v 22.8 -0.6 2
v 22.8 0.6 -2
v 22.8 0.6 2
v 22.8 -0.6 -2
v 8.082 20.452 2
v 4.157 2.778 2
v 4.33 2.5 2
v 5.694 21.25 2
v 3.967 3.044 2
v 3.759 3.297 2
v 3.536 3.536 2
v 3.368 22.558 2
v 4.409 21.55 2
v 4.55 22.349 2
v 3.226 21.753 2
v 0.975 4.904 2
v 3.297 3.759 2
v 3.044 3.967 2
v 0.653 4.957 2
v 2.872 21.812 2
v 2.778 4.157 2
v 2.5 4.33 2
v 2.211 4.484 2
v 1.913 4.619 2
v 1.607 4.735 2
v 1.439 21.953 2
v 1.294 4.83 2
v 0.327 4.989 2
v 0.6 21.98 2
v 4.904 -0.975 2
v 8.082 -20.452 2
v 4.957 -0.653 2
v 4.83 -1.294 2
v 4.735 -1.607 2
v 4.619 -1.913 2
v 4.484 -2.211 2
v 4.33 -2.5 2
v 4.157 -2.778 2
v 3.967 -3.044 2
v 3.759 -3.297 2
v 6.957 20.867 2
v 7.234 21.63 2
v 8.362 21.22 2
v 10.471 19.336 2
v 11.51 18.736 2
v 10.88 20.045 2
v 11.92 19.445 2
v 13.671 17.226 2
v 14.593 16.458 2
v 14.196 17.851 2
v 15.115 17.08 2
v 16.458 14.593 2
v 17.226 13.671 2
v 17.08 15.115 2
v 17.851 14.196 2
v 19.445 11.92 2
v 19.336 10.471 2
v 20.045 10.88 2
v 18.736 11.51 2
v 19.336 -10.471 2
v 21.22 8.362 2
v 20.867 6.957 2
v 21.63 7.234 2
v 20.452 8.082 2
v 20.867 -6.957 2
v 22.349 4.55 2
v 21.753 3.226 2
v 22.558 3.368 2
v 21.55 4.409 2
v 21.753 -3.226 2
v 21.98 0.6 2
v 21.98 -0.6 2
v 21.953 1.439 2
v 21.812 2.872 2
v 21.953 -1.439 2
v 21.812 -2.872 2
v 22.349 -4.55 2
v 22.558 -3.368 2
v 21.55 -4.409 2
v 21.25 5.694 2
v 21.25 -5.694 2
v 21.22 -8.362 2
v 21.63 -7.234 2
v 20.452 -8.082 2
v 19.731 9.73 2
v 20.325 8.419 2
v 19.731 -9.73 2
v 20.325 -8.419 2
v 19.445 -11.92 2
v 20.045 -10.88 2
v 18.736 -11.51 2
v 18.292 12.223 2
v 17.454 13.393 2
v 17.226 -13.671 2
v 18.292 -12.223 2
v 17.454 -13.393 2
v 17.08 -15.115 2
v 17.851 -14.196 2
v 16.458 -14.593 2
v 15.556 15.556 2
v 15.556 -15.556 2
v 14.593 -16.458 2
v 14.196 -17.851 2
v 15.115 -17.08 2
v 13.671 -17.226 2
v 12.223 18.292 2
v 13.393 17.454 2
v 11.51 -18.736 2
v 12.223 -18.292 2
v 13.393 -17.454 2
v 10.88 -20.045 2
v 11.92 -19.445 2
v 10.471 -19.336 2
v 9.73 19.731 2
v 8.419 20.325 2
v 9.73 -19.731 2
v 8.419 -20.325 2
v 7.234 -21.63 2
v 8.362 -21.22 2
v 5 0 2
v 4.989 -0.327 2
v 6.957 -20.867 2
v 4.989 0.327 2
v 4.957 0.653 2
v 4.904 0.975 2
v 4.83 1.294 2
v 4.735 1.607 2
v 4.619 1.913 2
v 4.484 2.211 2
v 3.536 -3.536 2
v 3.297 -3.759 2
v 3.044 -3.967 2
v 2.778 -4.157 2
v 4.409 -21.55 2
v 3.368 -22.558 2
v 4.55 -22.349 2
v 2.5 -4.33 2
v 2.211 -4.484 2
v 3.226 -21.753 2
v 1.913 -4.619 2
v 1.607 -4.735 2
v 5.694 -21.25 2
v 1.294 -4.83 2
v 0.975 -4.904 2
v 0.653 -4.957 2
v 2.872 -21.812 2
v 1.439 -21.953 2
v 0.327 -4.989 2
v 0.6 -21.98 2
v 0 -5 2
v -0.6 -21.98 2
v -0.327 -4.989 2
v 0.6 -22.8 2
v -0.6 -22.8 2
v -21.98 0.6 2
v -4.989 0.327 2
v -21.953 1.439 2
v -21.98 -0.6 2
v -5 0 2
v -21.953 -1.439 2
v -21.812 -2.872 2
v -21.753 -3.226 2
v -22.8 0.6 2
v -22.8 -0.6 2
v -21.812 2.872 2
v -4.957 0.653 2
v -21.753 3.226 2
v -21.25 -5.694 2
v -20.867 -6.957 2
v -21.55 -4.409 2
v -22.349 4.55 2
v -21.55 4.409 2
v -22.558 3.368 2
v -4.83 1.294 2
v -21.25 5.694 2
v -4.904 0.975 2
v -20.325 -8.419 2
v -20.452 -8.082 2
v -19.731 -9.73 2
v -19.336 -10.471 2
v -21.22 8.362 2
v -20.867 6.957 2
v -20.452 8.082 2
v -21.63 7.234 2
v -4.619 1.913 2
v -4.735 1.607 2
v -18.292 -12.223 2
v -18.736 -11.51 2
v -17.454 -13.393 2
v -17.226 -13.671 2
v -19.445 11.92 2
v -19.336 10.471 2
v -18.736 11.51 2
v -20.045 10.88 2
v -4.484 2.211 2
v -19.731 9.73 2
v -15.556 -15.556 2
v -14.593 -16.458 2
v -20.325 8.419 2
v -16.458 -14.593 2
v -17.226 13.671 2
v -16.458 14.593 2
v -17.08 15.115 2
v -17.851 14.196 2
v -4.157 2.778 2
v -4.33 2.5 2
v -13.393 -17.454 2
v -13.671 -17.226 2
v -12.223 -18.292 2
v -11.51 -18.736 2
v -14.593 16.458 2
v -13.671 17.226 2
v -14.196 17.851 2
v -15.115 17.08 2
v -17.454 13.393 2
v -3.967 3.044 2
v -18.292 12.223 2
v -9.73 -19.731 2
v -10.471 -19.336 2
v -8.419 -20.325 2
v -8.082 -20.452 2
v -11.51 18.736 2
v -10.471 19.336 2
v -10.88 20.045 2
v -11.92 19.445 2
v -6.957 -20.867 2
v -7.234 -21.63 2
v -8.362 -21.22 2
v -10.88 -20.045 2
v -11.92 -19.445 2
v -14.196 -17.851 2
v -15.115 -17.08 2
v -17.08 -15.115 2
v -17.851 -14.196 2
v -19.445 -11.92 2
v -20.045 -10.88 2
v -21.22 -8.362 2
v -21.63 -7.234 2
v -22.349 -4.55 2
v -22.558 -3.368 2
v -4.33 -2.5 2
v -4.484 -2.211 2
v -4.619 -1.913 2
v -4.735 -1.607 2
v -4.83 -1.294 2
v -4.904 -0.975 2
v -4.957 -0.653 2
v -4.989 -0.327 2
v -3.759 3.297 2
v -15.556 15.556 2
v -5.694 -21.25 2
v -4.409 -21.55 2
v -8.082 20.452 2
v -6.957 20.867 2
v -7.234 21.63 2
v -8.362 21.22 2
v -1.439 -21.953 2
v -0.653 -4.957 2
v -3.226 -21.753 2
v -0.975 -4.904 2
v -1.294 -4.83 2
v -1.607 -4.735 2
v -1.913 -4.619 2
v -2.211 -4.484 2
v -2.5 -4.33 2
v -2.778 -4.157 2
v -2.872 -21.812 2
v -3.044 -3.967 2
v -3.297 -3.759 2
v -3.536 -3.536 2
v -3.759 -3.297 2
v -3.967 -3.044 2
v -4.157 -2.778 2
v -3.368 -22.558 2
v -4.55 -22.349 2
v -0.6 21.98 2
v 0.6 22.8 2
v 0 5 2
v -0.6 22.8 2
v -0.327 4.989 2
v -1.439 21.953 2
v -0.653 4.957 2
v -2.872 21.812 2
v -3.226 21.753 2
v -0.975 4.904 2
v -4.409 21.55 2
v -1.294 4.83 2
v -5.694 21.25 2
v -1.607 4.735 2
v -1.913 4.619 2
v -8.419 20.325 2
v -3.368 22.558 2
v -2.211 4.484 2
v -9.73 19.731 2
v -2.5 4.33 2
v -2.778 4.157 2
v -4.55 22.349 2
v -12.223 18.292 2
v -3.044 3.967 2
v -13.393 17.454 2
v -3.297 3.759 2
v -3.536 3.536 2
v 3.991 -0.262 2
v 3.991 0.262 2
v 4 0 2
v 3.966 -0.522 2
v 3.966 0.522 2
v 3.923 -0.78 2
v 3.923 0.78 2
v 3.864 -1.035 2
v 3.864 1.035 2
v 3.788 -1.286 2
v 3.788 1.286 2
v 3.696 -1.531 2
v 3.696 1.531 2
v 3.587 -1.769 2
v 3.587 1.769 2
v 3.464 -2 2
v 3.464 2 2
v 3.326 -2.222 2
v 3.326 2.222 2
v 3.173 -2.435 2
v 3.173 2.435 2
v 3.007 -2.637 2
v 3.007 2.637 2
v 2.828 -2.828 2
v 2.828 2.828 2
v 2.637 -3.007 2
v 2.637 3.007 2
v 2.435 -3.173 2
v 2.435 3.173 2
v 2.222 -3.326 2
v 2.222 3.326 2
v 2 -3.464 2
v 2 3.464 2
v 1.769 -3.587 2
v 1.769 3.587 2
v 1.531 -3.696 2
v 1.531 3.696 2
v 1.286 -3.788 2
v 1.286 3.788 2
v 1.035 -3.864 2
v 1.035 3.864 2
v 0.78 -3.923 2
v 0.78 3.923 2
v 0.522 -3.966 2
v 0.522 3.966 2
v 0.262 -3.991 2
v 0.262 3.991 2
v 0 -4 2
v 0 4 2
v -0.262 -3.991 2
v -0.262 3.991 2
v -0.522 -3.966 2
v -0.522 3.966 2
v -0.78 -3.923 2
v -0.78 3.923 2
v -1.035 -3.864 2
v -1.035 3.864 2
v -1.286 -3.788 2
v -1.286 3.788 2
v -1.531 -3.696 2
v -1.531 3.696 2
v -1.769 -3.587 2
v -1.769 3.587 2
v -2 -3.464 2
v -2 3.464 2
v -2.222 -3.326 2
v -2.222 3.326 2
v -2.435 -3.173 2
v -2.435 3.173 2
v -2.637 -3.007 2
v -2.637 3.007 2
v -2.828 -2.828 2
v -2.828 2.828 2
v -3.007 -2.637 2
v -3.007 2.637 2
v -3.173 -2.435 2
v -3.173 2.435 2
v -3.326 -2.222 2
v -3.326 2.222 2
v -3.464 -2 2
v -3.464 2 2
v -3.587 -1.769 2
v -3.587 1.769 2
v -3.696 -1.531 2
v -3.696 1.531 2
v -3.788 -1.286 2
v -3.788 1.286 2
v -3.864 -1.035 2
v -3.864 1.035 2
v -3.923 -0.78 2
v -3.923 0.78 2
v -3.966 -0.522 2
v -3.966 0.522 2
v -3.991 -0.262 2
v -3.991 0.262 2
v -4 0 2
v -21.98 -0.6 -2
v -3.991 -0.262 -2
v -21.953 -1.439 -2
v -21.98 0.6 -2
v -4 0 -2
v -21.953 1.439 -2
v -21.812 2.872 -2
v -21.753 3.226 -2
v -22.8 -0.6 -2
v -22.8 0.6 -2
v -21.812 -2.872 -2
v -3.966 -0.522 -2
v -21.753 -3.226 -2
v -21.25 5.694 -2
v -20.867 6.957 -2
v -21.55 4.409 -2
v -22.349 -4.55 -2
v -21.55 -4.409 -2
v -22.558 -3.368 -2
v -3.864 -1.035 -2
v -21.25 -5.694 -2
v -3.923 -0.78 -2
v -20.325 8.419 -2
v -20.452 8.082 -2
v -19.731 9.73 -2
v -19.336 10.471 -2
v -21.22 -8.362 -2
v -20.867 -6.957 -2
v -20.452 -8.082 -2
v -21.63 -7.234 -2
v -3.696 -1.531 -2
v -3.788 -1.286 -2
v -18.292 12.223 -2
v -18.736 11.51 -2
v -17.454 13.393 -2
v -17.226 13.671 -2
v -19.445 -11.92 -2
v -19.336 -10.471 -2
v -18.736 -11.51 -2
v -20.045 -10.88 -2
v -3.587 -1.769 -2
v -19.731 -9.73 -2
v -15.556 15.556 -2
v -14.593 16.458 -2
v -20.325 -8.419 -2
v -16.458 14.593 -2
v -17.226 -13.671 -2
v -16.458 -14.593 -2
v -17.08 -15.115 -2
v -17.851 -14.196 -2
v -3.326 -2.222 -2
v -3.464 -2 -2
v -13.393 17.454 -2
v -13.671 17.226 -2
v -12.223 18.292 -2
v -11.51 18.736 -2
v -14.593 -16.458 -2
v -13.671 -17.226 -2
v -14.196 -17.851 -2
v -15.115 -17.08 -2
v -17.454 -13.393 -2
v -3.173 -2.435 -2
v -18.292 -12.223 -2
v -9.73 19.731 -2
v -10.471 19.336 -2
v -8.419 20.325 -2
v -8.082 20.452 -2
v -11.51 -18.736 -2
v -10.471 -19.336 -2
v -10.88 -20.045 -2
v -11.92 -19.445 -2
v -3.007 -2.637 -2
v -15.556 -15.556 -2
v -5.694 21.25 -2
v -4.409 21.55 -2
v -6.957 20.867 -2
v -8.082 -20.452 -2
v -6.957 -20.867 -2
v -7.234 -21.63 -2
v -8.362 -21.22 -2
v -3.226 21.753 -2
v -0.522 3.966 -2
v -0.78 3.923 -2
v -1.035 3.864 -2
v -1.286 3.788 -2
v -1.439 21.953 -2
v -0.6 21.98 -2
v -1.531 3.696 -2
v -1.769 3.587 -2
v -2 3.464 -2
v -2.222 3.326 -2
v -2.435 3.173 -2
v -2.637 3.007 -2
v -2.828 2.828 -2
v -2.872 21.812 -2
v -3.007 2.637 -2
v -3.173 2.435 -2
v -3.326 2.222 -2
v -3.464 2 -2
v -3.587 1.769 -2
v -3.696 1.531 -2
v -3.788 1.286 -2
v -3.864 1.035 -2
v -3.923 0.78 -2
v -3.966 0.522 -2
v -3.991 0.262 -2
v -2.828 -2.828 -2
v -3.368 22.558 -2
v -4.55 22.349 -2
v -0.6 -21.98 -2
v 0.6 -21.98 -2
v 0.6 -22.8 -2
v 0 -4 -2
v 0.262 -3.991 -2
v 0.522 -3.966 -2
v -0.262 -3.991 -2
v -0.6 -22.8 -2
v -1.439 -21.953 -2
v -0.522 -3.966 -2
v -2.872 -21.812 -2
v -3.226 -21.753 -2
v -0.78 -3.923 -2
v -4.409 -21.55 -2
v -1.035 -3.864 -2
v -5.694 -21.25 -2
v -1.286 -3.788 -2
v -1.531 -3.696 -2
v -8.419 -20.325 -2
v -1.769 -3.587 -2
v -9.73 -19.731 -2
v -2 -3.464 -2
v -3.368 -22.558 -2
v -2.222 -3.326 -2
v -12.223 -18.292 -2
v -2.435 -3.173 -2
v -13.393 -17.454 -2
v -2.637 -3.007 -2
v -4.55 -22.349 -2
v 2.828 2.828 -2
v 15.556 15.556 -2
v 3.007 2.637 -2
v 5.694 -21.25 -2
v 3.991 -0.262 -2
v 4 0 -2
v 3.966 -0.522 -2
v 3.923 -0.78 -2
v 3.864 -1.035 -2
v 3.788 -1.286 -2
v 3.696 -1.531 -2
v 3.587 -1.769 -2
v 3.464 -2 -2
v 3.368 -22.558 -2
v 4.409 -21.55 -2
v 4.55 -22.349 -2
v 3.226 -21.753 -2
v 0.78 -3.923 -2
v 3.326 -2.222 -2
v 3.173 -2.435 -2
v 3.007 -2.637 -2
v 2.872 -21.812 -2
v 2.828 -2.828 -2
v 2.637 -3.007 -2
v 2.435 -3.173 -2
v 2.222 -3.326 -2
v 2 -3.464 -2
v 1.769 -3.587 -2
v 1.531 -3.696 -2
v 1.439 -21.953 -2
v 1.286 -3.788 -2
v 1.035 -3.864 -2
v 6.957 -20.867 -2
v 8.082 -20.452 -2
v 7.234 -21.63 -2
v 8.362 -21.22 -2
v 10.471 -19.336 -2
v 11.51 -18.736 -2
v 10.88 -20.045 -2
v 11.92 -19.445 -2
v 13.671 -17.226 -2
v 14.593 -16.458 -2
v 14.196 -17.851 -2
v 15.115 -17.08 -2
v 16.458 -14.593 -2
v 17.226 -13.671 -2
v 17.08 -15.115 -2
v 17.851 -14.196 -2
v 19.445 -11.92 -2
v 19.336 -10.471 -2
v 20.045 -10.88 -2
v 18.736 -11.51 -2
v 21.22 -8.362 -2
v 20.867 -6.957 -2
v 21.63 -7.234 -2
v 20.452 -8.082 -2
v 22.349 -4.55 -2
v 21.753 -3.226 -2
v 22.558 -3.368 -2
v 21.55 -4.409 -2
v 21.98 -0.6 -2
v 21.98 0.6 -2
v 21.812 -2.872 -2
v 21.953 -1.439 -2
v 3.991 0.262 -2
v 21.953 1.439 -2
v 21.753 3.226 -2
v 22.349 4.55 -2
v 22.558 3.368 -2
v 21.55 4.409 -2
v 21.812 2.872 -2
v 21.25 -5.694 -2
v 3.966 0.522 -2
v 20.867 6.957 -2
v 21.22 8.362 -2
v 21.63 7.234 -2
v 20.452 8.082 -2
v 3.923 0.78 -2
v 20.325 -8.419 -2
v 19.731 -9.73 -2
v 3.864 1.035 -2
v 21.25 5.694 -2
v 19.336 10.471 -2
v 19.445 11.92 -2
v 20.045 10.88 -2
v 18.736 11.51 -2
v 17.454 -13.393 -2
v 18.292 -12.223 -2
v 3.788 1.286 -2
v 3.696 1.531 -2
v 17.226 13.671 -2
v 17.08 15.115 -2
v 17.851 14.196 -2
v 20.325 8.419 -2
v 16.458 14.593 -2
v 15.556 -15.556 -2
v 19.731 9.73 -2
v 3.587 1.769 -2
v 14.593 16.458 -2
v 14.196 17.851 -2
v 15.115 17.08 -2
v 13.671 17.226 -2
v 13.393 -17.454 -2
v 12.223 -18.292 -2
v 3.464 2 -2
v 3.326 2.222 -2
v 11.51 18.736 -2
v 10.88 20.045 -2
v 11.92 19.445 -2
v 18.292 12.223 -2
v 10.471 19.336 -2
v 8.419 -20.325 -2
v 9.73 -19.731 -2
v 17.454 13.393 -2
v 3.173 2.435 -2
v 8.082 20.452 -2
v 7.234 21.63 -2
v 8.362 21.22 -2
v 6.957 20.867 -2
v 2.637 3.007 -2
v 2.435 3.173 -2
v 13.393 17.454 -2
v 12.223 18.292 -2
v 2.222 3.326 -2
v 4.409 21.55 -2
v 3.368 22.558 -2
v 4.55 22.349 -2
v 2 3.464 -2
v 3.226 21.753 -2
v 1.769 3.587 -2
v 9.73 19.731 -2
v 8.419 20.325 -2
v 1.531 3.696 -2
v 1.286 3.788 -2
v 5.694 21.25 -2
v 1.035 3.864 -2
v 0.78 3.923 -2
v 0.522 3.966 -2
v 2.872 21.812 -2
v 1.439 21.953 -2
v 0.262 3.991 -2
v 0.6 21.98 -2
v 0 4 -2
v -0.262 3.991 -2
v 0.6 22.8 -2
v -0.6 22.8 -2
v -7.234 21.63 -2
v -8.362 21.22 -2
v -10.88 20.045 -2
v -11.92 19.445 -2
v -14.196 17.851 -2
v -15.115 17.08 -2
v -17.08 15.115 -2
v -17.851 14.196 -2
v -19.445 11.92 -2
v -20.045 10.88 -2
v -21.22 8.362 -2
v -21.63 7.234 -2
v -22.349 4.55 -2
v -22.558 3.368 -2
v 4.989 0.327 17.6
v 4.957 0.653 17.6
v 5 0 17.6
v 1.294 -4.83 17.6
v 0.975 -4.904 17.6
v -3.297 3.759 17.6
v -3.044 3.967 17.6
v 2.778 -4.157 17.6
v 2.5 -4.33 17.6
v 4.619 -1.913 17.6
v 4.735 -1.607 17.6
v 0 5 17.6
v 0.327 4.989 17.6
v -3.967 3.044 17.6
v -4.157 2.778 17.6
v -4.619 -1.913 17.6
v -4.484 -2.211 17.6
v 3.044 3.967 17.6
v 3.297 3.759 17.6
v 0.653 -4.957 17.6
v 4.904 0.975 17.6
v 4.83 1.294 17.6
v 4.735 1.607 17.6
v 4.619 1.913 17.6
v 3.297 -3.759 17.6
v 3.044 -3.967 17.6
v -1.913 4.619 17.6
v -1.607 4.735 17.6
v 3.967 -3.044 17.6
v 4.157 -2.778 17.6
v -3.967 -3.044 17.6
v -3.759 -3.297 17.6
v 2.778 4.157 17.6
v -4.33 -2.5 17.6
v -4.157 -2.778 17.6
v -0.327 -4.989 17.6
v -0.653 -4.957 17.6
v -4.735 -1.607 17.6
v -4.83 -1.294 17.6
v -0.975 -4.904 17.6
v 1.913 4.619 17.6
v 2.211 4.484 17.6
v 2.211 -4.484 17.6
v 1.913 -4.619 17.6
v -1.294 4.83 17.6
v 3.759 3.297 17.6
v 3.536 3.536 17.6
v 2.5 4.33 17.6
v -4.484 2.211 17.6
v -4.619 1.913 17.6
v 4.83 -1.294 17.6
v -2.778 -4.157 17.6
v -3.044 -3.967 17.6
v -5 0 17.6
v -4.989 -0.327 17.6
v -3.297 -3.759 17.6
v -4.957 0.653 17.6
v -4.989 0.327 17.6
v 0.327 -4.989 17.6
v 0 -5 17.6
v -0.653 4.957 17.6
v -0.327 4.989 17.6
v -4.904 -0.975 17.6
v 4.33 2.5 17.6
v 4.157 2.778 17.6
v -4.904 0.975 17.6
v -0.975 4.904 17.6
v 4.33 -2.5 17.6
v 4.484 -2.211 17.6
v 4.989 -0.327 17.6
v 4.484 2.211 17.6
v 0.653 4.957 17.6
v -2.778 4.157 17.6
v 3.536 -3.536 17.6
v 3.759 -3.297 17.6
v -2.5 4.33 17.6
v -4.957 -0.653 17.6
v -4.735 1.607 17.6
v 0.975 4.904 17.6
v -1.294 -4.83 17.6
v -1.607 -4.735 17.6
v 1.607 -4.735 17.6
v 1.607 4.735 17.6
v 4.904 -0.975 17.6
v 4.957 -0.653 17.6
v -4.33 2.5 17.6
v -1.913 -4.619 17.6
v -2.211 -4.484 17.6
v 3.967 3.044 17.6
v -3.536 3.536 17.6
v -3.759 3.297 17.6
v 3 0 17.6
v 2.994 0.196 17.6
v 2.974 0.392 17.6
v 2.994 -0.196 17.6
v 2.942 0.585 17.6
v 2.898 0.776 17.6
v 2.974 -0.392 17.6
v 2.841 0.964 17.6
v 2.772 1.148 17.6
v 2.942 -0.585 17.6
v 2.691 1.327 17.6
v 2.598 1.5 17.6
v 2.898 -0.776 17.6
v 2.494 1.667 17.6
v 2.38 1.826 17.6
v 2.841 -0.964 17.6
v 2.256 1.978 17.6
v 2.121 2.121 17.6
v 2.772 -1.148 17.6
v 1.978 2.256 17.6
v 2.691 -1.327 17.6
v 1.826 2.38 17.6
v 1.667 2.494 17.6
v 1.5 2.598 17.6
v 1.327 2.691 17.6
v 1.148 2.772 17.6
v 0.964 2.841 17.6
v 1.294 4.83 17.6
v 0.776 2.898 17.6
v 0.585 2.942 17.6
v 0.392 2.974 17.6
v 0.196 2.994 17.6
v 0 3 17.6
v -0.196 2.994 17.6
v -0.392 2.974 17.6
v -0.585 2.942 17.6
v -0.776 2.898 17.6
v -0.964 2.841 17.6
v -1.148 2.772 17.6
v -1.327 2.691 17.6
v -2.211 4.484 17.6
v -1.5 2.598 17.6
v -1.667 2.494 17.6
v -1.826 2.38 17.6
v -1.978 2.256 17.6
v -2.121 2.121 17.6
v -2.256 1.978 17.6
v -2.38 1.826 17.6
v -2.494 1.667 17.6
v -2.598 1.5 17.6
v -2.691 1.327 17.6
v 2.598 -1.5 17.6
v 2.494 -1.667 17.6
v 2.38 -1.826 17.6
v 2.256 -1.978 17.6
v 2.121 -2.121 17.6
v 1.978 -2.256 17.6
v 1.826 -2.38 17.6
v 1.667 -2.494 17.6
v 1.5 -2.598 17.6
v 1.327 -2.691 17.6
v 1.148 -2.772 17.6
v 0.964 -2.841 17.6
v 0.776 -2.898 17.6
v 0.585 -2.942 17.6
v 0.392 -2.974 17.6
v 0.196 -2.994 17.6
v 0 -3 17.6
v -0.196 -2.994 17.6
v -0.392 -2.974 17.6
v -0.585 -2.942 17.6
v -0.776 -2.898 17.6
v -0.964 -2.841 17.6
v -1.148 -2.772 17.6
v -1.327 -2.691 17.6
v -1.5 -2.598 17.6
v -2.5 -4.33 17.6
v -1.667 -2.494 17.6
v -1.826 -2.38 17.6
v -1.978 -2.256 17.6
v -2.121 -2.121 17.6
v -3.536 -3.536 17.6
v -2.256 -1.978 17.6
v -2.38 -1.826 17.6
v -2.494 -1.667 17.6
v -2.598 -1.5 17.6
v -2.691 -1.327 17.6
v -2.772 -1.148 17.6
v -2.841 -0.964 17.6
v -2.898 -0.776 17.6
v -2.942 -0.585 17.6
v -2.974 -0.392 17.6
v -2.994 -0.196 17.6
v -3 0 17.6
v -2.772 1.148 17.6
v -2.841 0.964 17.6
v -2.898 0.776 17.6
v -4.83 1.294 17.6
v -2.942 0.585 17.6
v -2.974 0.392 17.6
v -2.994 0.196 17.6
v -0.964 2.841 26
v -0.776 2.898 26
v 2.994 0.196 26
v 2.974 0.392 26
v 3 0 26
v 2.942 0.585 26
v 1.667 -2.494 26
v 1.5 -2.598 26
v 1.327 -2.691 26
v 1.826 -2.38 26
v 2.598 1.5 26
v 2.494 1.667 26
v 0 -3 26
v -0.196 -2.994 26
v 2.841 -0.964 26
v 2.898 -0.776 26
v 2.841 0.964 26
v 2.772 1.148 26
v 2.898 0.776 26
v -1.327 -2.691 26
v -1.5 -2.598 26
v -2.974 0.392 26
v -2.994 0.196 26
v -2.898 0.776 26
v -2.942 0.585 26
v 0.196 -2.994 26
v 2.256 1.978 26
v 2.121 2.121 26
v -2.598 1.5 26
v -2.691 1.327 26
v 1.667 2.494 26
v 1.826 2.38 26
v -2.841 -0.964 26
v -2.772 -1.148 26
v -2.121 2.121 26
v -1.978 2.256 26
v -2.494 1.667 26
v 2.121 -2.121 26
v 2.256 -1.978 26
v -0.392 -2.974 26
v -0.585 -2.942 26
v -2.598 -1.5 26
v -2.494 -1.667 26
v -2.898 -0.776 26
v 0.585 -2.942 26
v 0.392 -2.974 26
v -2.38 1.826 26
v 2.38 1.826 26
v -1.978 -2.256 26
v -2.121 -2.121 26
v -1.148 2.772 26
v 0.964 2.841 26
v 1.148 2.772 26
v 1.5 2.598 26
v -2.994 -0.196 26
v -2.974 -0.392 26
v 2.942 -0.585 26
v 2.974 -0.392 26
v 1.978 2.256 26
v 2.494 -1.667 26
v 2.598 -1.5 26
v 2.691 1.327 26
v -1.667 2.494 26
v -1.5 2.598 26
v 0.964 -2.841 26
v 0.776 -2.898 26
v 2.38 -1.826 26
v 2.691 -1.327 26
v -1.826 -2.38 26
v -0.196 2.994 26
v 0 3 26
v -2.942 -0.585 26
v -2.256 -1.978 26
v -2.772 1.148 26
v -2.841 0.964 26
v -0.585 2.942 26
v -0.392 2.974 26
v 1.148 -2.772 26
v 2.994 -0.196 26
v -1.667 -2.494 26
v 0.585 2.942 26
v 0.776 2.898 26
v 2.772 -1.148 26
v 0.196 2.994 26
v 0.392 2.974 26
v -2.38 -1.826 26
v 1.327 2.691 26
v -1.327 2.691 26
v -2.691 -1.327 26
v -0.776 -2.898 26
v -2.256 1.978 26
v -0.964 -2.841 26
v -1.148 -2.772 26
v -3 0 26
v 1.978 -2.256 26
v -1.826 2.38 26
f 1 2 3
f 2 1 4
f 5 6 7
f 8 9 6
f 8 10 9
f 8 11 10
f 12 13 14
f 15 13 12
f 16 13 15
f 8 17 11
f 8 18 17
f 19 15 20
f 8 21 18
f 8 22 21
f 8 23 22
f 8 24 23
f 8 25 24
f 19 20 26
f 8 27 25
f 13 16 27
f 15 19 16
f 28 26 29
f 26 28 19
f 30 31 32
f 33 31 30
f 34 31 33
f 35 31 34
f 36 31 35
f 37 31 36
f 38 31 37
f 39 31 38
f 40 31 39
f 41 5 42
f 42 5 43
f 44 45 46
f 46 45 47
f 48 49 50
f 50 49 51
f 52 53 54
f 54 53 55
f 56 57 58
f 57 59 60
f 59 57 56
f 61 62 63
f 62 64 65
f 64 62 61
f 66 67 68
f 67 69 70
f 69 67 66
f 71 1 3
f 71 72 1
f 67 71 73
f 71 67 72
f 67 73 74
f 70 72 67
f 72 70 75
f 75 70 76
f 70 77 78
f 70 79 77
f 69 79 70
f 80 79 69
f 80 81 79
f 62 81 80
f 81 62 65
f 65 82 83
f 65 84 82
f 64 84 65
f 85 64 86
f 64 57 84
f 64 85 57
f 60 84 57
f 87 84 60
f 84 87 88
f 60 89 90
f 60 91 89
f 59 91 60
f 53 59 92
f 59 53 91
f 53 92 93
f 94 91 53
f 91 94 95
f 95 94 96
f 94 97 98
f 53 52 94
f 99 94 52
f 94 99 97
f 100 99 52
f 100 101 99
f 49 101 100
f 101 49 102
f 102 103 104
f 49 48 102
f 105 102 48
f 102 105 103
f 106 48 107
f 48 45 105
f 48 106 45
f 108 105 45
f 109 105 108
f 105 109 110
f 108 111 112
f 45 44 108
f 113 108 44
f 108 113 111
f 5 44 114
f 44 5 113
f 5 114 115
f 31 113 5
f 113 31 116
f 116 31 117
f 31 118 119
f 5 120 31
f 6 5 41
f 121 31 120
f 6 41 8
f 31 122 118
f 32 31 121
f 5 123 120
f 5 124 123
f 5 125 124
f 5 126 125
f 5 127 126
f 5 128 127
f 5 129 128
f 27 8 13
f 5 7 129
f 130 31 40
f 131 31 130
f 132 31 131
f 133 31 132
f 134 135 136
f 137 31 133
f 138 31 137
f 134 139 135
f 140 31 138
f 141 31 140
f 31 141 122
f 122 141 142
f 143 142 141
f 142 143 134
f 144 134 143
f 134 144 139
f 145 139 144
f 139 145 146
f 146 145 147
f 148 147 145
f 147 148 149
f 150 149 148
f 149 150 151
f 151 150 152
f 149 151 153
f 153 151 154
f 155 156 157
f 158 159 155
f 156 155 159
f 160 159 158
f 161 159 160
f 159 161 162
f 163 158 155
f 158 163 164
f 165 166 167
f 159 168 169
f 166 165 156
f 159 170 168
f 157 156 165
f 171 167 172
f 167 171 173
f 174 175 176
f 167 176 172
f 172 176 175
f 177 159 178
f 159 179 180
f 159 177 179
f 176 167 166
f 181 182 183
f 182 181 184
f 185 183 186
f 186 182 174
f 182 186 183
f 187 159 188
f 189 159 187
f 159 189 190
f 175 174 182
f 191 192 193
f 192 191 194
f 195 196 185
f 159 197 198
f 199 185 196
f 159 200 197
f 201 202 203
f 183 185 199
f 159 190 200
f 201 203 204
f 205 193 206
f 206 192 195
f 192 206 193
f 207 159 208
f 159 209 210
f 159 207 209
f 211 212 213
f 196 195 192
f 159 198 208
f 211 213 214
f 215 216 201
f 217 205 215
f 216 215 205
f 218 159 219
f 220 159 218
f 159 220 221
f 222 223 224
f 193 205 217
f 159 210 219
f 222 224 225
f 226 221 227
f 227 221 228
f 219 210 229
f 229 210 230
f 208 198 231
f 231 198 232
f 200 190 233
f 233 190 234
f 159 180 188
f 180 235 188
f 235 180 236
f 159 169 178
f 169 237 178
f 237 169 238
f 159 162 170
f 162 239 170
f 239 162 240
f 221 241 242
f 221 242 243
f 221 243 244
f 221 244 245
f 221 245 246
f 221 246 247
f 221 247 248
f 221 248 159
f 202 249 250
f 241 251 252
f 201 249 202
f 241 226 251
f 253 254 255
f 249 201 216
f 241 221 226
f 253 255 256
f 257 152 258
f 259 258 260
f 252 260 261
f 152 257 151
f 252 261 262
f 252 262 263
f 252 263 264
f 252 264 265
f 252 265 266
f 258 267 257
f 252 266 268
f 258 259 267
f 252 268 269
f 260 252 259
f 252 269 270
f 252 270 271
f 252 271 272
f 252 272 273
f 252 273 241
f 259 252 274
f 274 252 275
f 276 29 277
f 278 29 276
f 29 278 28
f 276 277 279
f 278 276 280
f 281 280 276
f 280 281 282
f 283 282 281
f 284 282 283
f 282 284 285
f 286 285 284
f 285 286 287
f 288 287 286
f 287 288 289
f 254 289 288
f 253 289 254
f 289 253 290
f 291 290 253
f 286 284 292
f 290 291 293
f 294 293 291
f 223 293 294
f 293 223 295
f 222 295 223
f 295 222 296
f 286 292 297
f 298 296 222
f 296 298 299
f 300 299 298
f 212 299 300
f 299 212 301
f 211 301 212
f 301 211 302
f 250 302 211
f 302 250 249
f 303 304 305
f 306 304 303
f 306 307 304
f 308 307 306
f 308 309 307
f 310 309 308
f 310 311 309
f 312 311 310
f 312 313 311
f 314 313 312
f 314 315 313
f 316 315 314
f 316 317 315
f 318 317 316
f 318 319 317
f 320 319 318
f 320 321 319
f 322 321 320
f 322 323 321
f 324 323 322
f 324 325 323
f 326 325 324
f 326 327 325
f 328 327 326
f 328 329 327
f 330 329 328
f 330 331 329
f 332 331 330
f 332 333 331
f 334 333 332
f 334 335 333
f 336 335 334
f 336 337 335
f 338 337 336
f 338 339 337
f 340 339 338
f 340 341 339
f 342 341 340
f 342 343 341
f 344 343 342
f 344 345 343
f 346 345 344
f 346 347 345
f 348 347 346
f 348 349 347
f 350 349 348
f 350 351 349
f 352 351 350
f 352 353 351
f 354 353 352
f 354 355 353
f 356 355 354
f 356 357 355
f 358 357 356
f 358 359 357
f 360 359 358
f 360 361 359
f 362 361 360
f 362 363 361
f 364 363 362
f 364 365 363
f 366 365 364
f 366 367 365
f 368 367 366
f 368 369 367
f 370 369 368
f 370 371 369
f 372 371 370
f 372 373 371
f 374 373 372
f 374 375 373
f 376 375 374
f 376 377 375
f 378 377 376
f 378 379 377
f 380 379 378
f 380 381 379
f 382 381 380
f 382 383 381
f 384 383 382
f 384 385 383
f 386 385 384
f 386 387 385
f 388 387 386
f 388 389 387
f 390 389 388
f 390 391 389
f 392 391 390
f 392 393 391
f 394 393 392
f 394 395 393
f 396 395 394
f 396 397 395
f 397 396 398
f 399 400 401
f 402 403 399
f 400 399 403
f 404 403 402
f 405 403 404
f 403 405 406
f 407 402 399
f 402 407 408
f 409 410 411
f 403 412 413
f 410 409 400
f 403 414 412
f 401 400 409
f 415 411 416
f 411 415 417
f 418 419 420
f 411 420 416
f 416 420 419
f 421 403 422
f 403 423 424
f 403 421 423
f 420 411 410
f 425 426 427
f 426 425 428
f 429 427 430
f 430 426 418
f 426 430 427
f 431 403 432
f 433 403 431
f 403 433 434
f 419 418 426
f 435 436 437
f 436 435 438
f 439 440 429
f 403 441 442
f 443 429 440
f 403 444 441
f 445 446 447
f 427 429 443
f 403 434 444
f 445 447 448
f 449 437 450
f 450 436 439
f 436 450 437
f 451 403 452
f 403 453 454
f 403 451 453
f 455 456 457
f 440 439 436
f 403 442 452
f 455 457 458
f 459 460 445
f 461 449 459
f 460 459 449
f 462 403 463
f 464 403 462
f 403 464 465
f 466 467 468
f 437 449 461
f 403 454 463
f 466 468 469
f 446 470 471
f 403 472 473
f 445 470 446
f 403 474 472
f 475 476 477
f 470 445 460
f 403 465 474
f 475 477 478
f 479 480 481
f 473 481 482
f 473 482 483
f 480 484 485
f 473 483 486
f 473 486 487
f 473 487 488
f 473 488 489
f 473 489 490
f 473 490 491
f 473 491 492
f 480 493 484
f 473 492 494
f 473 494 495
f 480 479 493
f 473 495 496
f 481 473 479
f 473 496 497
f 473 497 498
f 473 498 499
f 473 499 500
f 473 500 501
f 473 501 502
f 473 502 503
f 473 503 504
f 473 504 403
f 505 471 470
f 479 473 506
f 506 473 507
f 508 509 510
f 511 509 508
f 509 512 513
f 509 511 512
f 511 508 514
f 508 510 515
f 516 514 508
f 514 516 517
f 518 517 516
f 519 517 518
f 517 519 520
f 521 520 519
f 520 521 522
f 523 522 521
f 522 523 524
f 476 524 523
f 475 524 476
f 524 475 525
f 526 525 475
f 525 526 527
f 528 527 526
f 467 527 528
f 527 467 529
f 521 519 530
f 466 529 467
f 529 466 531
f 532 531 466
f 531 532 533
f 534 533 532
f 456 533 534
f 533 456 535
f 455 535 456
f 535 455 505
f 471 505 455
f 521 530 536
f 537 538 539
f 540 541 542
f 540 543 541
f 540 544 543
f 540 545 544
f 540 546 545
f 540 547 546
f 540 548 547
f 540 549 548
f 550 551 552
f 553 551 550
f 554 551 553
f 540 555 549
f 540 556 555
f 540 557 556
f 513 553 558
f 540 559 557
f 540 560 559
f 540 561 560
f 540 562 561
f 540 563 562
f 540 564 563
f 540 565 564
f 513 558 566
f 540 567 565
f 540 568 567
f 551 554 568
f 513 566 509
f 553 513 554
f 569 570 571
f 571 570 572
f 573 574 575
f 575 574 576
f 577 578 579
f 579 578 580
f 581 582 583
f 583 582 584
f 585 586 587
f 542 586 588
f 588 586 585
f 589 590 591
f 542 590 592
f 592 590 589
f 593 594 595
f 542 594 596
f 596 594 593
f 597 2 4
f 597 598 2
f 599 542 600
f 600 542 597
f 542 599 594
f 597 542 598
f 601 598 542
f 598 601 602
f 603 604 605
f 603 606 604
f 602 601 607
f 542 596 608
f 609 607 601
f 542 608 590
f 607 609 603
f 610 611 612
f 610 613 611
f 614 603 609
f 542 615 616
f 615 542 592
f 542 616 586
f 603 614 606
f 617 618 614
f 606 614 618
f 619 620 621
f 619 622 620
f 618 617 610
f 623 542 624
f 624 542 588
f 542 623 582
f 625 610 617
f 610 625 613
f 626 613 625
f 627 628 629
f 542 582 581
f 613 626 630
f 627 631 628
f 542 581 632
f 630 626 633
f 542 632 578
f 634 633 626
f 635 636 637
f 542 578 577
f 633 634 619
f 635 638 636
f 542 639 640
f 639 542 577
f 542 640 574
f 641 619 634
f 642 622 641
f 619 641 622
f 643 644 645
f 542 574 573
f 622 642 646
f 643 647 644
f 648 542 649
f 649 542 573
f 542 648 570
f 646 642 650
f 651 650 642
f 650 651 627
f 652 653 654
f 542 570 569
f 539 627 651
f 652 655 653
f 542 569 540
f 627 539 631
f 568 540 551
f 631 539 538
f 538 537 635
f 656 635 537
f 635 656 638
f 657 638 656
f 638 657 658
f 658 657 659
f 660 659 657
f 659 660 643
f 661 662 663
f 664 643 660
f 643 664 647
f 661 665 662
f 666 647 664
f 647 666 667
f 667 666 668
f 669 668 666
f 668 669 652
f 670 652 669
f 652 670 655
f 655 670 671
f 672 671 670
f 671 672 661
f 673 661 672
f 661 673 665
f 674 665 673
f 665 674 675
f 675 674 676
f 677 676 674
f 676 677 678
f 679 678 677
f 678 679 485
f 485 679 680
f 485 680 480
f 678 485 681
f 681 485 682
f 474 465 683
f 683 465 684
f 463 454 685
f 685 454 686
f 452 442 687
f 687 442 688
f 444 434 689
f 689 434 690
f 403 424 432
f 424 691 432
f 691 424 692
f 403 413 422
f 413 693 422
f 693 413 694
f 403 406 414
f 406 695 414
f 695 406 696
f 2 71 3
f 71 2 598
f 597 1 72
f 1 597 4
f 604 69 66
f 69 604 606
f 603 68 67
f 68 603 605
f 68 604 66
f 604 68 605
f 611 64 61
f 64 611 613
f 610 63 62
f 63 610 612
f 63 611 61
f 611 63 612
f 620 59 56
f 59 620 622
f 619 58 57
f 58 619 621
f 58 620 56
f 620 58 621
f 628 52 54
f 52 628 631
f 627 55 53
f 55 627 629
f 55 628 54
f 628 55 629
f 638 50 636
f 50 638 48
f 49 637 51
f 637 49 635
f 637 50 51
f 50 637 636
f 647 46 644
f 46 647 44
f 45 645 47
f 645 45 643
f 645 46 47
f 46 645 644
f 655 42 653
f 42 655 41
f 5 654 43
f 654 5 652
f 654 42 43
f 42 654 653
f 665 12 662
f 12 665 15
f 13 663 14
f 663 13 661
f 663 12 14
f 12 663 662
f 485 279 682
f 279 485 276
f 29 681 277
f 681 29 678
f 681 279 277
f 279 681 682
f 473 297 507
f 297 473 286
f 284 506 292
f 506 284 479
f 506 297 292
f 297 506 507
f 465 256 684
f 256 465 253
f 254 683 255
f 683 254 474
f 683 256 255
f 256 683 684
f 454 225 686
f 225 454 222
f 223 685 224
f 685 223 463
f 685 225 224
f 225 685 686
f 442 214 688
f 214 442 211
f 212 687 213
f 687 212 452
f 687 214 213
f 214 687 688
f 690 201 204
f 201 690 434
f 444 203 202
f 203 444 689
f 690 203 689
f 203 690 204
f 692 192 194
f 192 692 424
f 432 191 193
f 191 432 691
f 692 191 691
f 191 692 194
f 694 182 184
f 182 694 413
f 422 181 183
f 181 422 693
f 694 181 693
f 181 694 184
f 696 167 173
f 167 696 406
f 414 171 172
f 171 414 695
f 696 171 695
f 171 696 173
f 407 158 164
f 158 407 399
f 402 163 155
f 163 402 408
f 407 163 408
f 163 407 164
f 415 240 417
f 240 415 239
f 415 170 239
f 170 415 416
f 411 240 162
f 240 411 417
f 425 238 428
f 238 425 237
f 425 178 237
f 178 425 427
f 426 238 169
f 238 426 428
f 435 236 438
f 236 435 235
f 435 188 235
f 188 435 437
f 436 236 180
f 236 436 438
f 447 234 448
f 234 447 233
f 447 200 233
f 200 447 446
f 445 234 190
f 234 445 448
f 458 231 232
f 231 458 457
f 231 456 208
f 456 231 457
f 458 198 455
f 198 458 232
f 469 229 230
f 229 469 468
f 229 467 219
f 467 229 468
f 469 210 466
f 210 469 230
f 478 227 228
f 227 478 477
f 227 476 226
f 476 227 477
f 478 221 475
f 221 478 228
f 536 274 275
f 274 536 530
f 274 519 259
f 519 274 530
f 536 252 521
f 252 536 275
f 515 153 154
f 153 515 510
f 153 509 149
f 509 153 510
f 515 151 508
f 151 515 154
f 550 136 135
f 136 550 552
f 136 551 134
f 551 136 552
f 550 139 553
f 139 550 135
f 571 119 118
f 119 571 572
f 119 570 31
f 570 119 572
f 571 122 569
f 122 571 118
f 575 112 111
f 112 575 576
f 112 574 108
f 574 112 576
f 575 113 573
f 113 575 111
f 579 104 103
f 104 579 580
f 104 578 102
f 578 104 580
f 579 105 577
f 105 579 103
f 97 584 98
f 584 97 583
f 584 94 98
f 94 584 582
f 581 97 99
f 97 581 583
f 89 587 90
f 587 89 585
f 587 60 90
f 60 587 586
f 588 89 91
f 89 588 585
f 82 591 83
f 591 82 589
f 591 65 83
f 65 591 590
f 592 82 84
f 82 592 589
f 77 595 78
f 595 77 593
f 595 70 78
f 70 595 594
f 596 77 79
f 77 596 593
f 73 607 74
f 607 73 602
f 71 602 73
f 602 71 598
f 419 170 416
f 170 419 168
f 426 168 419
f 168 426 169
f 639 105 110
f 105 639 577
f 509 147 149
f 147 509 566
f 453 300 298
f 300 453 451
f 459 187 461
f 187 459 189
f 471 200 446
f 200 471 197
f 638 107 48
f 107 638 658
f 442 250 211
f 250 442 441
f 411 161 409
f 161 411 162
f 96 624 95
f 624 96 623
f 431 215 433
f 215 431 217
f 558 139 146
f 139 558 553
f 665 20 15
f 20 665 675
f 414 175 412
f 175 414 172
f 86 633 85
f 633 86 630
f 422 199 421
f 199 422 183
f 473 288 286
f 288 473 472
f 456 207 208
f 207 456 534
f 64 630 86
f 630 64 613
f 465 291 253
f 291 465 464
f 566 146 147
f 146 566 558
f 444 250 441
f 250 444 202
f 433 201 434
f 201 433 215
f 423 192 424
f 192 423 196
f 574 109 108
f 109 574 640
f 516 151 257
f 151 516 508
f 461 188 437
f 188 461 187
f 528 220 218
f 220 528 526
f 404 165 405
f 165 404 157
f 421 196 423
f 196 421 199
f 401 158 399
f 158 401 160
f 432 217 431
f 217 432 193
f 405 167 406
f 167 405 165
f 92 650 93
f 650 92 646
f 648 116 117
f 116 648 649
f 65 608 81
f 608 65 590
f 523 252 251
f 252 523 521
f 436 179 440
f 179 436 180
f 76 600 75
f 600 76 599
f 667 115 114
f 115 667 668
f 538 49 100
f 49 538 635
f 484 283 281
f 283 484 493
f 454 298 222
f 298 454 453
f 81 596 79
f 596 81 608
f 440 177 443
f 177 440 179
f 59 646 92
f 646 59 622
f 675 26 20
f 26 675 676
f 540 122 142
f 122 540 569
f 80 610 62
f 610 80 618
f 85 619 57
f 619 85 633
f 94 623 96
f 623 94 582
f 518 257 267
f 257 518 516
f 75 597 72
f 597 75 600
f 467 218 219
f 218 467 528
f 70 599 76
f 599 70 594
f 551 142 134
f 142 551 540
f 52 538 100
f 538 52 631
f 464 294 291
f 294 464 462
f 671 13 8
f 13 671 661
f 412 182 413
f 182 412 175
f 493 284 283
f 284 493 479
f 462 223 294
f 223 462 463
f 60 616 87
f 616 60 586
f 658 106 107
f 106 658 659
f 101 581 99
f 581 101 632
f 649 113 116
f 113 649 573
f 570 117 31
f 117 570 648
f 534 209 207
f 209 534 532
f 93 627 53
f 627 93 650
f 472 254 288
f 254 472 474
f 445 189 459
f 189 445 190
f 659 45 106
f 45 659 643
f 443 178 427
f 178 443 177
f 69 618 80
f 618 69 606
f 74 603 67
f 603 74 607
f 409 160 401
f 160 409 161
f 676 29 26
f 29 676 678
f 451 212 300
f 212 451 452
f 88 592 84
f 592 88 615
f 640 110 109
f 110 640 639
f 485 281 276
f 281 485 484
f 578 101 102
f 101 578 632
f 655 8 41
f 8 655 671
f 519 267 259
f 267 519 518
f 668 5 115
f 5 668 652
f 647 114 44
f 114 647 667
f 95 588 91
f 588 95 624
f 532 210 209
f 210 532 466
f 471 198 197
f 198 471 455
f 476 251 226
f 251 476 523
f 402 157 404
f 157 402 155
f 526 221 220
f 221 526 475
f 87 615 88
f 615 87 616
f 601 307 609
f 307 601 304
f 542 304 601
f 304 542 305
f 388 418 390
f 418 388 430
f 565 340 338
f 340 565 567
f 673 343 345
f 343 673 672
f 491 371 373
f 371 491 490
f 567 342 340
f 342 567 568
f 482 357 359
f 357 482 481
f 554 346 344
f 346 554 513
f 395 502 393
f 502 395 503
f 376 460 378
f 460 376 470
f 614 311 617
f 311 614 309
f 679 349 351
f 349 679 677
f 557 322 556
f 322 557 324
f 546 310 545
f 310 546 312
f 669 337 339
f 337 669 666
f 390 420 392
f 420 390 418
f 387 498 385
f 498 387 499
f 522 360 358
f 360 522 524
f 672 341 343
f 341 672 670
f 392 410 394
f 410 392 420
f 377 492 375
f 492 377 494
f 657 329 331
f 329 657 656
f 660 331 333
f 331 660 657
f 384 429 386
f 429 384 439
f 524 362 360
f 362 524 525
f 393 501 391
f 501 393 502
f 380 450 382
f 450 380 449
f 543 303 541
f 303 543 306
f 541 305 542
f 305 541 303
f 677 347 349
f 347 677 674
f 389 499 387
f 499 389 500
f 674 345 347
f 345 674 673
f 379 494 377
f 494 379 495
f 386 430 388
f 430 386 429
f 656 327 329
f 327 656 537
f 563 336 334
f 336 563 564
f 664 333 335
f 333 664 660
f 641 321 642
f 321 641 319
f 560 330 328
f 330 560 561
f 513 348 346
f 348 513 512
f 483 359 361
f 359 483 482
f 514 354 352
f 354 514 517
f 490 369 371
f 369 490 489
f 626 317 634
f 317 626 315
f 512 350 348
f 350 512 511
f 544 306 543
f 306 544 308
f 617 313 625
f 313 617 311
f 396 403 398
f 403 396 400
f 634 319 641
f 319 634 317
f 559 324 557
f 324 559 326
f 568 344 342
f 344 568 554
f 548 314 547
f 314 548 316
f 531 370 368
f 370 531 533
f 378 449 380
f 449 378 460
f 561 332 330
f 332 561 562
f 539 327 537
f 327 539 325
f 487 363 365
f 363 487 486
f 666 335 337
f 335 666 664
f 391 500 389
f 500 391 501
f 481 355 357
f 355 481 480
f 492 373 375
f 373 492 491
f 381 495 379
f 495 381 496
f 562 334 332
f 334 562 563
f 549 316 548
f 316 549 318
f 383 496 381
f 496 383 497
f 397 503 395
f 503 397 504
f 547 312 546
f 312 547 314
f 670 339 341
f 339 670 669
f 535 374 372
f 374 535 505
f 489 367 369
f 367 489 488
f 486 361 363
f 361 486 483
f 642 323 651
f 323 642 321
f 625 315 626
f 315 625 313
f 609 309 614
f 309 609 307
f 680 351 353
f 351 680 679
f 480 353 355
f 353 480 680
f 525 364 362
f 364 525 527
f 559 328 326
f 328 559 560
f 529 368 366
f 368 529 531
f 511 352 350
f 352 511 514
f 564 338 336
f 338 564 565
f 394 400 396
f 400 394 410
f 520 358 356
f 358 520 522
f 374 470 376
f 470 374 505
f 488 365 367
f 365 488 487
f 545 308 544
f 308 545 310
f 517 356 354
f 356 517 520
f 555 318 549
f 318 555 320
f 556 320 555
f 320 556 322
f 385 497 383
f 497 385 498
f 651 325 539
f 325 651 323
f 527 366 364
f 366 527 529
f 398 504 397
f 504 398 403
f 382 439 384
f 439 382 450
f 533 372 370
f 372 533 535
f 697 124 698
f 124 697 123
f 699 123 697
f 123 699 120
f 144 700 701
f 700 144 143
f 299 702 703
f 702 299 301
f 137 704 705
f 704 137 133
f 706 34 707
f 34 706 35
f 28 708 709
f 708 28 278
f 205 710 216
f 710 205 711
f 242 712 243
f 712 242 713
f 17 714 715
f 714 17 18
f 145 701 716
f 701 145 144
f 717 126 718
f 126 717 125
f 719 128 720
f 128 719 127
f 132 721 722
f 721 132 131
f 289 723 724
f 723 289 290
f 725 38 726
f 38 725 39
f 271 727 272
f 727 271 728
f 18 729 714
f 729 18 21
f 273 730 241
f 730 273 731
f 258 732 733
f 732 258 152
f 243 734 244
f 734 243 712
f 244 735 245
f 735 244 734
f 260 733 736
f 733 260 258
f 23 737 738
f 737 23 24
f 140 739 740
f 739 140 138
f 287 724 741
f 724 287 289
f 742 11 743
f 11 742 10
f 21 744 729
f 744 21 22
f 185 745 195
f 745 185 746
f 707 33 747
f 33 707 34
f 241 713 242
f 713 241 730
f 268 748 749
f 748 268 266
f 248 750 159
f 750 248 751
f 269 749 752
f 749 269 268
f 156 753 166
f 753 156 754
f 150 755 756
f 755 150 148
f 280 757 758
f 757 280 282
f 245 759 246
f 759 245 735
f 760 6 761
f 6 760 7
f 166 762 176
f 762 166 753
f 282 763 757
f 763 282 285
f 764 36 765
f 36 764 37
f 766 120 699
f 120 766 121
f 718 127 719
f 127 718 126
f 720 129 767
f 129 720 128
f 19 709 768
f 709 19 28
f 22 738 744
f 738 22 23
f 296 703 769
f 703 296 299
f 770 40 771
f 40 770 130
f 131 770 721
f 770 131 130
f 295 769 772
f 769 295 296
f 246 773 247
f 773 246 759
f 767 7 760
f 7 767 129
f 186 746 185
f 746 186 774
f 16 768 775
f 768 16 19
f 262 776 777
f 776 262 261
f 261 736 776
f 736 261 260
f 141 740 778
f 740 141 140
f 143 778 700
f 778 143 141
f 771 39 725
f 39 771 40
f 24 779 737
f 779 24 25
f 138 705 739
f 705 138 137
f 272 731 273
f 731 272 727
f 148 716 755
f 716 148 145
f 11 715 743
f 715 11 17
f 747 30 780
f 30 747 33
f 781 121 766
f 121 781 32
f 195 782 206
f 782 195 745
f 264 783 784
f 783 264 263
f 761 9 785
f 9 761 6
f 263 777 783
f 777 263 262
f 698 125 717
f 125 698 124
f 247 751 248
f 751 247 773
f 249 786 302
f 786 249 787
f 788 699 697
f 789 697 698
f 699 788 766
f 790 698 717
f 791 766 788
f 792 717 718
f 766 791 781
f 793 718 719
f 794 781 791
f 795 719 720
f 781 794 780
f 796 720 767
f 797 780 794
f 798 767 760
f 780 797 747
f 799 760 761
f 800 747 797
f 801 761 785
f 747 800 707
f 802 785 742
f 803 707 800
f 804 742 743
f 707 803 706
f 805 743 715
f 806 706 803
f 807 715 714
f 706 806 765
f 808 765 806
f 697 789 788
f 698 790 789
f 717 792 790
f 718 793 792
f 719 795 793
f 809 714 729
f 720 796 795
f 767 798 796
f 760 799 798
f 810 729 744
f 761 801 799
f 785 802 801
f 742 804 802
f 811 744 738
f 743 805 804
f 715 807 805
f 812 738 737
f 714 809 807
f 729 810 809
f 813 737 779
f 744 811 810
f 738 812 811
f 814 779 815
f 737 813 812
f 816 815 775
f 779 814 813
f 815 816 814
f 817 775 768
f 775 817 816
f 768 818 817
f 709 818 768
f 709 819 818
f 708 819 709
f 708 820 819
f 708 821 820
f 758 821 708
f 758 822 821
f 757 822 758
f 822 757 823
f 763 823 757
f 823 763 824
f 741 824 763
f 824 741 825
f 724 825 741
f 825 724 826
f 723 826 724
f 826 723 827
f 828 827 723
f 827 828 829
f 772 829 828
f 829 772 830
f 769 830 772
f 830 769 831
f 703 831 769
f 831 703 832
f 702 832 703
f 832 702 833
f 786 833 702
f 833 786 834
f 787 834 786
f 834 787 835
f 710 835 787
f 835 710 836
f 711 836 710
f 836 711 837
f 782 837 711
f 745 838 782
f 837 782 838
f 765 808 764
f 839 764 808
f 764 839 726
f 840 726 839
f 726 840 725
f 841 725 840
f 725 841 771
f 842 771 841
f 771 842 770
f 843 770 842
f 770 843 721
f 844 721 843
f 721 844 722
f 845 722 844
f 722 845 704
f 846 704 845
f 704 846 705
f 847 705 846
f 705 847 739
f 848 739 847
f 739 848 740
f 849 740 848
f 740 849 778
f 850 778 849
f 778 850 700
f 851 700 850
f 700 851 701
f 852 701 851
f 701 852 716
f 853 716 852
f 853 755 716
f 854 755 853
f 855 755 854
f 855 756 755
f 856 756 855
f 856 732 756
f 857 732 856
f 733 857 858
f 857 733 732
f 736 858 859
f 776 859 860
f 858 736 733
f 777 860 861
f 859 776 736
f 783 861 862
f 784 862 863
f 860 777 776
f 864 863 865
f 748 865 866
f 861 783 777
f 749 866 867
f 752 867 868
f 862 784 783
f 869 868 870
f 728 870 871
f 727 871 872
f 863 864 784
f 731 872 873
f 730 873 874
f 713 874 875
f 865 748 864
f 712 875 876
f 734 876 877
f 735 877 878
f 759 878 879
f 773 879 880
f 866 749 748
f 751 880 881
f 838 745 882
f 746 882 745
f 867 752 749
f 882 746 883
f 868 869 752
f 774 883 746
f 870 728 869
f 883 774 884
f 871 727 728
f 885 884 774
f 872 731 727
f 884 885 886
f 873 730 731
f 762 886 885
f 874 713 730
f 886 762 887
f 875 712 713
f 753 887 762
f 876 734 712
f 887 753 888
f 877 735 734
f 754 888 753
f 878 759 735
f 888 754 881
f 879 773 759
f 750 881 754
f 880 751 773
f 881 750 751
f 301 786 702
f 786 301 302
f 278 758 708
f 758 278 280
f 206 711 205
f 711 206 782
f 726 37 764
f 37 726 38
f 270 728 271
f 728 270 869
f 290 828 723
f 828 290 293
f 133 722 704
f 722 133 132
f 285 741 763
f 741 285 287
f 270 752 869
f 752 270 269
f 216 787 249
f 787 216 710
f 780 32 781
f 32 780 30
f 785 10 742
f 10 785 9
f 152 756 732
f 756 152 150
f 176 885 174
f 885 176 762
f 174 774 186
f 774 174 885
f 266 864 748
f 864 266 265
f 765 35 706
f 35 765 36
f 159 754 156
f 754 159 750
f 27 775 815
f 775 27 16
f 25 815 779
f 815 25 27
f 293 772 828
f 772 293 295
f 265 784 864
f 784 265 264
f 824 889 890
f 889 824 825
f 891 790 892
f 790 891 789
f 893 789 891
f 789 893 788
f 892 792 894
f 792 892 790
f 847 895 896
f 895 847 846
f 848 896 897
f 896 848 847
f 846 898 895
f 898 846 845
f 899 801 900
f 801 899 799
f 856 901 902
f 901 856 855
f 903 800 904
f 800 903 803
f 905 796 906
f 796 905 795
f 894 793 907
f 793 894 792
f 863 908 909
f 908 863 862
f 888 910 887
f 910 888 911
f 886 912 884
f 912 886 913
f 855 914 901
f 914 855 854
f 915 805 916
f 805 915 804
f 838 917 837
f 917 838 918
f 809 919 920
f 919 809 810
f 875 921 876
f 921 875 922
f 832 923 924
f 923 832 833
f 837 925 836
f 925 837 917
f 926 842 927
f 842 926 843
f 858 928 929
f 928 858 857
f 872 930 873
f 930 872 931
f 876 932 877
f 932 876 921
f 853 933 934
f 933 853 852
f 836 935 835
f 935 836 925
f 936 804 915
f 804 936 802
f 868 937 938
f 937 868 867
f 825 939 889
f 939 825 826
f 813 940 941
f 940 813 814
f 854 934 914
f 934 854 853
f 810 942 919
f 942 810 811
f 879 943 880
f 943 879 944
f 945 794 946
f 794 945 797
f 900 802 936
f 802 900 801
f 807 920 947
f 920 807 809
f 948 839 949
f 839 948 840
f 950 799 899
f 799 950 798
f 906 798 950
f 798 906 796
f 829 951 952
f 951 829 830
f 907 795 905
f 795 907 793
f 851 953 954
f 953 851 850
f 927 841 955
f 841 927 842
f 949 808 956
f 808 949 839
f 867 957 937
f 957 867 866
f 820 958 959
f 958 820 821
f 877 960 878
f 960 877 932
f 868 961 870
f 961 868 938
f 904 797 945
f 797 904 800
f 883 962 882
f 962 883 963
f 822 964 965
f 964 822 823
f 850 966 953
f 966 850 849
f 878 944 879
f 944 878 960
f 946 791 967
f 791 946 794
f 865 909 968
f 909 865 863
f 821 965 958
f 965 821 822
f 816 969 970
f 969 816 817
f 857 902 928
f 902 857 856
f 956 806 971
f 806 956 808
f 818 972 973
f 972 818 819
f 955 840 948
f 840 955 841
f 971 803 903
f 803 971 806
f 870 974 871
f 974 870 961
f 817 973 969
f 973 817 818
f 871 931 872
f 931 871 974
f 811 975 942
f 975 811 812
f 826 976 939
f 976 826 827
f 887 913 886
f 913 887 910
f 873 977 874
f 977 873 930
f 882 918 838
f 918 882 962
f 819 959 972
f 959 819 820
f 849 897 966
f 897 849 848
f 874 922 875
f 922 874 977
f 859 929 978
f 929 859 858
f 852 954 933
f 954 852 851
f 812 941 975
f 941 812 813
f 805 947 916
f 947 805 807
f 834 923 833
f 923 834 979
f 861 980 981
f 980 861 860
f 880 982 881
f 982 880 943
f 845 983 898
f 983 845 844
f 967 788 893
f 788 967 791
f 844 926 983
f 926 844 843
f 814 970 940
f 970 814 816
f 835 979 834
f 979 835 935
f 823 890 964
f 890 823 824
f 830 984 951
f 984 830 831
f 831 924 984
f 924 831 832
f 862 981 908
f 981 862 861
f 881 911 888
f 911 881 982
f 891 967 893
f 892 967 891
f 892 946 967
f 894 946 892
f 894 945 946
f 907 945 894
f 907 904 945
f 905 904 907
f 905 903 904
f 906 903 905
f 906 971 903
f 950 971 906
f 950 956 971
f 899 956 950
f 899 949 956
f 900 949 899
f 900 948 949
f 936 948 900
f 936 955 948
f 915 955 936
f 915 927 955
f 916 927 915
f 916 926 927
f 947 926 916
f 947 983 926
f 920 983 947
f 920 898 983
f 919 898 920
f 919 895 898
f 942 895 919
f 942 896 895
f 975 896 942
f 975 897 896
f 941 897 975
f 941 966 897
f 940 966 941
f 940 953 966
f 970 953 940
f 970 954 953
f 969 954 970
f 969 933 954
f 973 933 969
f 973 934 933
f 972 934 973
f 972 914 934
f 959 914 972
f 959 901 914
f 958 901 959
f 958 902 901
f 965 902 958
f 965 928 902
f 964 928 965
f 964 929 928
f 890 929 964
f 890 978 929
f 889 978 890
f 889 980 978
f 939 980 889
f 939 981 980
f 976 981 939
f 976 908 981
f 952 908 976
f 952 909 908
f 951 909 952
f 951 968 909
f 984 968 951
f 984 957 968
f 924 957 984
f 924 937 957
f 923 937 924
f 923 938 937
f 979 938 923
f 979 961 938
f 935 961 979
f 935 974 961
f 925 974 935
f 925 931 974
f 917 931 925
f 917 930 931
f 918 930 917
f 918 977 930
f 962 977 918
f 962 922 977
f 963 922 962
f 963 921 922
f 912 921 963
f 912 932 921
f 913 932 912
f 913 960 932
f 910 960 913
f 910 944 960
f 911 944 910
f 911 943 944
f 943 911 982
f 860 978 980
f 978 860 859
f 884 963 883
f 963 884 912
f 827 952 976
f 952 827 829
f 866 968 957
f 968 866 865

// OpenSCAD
// Self-contained OpenSCAD animation sample.
// Open this file directly in OpenSCAD.
// SPDX-License-Identifier: MIT

// ------------------------------
// Controls
// ------------------------------
mode = "spin_exploded"; // "spin", "exploded", "spin_exploded"
turns = 1.0;            // full revolutions during one animation cycle
explode_mm = 12;        // separation distance in exploded modes

$fn = 96;

module gear_like(d = 44, th = 4, teeth = 36, tooth_h = 1.6) {
    difference() {
        union() {
            cylinder(d = d, h = th, center = true);
            for (i = [0 : teeth - 1])
                rotate([0, 0, i * 360 / teeth])
                    translate([d / 2, 0, 0])
                        cube([tooth_h, 1.2, th], center = true);
        }
        cylinder(d = 8, h = th + 1, center = true);
    }
}

module pin_part(h = 24, d1 = 10, d2 = 6) {
    union() {
        cylinder(d = d1, h = h * 0.65, center = false);
        translate([0, 0, h * 0.65]) cylinder(d = d2, h = h * 0.35, center = false);
    }
}

module sample_assembly(explode = 0, theta = 0) {
    rotate([0, 0, theta]) {
        color([0.72, 0.52, 0.25])
            gear_like();

        // Move second part along Z for exploded view.
        color([0.25, 0.65, 0.85])
            translate([0, 0, 2 + explode])
                pin_part();
    }
}

if (mode == "spin") {
    sample_assembly(explode = 0, theta = 360 * turns * $t);
} else if (mode == "exploded") {
    sample_assembly(explode = explode_mm * $t, theta = 0);
} else {
    // spin_exploded
    sample_assembly(explode = explode_mm * $t, theta = 360 * turns * $t);
}
